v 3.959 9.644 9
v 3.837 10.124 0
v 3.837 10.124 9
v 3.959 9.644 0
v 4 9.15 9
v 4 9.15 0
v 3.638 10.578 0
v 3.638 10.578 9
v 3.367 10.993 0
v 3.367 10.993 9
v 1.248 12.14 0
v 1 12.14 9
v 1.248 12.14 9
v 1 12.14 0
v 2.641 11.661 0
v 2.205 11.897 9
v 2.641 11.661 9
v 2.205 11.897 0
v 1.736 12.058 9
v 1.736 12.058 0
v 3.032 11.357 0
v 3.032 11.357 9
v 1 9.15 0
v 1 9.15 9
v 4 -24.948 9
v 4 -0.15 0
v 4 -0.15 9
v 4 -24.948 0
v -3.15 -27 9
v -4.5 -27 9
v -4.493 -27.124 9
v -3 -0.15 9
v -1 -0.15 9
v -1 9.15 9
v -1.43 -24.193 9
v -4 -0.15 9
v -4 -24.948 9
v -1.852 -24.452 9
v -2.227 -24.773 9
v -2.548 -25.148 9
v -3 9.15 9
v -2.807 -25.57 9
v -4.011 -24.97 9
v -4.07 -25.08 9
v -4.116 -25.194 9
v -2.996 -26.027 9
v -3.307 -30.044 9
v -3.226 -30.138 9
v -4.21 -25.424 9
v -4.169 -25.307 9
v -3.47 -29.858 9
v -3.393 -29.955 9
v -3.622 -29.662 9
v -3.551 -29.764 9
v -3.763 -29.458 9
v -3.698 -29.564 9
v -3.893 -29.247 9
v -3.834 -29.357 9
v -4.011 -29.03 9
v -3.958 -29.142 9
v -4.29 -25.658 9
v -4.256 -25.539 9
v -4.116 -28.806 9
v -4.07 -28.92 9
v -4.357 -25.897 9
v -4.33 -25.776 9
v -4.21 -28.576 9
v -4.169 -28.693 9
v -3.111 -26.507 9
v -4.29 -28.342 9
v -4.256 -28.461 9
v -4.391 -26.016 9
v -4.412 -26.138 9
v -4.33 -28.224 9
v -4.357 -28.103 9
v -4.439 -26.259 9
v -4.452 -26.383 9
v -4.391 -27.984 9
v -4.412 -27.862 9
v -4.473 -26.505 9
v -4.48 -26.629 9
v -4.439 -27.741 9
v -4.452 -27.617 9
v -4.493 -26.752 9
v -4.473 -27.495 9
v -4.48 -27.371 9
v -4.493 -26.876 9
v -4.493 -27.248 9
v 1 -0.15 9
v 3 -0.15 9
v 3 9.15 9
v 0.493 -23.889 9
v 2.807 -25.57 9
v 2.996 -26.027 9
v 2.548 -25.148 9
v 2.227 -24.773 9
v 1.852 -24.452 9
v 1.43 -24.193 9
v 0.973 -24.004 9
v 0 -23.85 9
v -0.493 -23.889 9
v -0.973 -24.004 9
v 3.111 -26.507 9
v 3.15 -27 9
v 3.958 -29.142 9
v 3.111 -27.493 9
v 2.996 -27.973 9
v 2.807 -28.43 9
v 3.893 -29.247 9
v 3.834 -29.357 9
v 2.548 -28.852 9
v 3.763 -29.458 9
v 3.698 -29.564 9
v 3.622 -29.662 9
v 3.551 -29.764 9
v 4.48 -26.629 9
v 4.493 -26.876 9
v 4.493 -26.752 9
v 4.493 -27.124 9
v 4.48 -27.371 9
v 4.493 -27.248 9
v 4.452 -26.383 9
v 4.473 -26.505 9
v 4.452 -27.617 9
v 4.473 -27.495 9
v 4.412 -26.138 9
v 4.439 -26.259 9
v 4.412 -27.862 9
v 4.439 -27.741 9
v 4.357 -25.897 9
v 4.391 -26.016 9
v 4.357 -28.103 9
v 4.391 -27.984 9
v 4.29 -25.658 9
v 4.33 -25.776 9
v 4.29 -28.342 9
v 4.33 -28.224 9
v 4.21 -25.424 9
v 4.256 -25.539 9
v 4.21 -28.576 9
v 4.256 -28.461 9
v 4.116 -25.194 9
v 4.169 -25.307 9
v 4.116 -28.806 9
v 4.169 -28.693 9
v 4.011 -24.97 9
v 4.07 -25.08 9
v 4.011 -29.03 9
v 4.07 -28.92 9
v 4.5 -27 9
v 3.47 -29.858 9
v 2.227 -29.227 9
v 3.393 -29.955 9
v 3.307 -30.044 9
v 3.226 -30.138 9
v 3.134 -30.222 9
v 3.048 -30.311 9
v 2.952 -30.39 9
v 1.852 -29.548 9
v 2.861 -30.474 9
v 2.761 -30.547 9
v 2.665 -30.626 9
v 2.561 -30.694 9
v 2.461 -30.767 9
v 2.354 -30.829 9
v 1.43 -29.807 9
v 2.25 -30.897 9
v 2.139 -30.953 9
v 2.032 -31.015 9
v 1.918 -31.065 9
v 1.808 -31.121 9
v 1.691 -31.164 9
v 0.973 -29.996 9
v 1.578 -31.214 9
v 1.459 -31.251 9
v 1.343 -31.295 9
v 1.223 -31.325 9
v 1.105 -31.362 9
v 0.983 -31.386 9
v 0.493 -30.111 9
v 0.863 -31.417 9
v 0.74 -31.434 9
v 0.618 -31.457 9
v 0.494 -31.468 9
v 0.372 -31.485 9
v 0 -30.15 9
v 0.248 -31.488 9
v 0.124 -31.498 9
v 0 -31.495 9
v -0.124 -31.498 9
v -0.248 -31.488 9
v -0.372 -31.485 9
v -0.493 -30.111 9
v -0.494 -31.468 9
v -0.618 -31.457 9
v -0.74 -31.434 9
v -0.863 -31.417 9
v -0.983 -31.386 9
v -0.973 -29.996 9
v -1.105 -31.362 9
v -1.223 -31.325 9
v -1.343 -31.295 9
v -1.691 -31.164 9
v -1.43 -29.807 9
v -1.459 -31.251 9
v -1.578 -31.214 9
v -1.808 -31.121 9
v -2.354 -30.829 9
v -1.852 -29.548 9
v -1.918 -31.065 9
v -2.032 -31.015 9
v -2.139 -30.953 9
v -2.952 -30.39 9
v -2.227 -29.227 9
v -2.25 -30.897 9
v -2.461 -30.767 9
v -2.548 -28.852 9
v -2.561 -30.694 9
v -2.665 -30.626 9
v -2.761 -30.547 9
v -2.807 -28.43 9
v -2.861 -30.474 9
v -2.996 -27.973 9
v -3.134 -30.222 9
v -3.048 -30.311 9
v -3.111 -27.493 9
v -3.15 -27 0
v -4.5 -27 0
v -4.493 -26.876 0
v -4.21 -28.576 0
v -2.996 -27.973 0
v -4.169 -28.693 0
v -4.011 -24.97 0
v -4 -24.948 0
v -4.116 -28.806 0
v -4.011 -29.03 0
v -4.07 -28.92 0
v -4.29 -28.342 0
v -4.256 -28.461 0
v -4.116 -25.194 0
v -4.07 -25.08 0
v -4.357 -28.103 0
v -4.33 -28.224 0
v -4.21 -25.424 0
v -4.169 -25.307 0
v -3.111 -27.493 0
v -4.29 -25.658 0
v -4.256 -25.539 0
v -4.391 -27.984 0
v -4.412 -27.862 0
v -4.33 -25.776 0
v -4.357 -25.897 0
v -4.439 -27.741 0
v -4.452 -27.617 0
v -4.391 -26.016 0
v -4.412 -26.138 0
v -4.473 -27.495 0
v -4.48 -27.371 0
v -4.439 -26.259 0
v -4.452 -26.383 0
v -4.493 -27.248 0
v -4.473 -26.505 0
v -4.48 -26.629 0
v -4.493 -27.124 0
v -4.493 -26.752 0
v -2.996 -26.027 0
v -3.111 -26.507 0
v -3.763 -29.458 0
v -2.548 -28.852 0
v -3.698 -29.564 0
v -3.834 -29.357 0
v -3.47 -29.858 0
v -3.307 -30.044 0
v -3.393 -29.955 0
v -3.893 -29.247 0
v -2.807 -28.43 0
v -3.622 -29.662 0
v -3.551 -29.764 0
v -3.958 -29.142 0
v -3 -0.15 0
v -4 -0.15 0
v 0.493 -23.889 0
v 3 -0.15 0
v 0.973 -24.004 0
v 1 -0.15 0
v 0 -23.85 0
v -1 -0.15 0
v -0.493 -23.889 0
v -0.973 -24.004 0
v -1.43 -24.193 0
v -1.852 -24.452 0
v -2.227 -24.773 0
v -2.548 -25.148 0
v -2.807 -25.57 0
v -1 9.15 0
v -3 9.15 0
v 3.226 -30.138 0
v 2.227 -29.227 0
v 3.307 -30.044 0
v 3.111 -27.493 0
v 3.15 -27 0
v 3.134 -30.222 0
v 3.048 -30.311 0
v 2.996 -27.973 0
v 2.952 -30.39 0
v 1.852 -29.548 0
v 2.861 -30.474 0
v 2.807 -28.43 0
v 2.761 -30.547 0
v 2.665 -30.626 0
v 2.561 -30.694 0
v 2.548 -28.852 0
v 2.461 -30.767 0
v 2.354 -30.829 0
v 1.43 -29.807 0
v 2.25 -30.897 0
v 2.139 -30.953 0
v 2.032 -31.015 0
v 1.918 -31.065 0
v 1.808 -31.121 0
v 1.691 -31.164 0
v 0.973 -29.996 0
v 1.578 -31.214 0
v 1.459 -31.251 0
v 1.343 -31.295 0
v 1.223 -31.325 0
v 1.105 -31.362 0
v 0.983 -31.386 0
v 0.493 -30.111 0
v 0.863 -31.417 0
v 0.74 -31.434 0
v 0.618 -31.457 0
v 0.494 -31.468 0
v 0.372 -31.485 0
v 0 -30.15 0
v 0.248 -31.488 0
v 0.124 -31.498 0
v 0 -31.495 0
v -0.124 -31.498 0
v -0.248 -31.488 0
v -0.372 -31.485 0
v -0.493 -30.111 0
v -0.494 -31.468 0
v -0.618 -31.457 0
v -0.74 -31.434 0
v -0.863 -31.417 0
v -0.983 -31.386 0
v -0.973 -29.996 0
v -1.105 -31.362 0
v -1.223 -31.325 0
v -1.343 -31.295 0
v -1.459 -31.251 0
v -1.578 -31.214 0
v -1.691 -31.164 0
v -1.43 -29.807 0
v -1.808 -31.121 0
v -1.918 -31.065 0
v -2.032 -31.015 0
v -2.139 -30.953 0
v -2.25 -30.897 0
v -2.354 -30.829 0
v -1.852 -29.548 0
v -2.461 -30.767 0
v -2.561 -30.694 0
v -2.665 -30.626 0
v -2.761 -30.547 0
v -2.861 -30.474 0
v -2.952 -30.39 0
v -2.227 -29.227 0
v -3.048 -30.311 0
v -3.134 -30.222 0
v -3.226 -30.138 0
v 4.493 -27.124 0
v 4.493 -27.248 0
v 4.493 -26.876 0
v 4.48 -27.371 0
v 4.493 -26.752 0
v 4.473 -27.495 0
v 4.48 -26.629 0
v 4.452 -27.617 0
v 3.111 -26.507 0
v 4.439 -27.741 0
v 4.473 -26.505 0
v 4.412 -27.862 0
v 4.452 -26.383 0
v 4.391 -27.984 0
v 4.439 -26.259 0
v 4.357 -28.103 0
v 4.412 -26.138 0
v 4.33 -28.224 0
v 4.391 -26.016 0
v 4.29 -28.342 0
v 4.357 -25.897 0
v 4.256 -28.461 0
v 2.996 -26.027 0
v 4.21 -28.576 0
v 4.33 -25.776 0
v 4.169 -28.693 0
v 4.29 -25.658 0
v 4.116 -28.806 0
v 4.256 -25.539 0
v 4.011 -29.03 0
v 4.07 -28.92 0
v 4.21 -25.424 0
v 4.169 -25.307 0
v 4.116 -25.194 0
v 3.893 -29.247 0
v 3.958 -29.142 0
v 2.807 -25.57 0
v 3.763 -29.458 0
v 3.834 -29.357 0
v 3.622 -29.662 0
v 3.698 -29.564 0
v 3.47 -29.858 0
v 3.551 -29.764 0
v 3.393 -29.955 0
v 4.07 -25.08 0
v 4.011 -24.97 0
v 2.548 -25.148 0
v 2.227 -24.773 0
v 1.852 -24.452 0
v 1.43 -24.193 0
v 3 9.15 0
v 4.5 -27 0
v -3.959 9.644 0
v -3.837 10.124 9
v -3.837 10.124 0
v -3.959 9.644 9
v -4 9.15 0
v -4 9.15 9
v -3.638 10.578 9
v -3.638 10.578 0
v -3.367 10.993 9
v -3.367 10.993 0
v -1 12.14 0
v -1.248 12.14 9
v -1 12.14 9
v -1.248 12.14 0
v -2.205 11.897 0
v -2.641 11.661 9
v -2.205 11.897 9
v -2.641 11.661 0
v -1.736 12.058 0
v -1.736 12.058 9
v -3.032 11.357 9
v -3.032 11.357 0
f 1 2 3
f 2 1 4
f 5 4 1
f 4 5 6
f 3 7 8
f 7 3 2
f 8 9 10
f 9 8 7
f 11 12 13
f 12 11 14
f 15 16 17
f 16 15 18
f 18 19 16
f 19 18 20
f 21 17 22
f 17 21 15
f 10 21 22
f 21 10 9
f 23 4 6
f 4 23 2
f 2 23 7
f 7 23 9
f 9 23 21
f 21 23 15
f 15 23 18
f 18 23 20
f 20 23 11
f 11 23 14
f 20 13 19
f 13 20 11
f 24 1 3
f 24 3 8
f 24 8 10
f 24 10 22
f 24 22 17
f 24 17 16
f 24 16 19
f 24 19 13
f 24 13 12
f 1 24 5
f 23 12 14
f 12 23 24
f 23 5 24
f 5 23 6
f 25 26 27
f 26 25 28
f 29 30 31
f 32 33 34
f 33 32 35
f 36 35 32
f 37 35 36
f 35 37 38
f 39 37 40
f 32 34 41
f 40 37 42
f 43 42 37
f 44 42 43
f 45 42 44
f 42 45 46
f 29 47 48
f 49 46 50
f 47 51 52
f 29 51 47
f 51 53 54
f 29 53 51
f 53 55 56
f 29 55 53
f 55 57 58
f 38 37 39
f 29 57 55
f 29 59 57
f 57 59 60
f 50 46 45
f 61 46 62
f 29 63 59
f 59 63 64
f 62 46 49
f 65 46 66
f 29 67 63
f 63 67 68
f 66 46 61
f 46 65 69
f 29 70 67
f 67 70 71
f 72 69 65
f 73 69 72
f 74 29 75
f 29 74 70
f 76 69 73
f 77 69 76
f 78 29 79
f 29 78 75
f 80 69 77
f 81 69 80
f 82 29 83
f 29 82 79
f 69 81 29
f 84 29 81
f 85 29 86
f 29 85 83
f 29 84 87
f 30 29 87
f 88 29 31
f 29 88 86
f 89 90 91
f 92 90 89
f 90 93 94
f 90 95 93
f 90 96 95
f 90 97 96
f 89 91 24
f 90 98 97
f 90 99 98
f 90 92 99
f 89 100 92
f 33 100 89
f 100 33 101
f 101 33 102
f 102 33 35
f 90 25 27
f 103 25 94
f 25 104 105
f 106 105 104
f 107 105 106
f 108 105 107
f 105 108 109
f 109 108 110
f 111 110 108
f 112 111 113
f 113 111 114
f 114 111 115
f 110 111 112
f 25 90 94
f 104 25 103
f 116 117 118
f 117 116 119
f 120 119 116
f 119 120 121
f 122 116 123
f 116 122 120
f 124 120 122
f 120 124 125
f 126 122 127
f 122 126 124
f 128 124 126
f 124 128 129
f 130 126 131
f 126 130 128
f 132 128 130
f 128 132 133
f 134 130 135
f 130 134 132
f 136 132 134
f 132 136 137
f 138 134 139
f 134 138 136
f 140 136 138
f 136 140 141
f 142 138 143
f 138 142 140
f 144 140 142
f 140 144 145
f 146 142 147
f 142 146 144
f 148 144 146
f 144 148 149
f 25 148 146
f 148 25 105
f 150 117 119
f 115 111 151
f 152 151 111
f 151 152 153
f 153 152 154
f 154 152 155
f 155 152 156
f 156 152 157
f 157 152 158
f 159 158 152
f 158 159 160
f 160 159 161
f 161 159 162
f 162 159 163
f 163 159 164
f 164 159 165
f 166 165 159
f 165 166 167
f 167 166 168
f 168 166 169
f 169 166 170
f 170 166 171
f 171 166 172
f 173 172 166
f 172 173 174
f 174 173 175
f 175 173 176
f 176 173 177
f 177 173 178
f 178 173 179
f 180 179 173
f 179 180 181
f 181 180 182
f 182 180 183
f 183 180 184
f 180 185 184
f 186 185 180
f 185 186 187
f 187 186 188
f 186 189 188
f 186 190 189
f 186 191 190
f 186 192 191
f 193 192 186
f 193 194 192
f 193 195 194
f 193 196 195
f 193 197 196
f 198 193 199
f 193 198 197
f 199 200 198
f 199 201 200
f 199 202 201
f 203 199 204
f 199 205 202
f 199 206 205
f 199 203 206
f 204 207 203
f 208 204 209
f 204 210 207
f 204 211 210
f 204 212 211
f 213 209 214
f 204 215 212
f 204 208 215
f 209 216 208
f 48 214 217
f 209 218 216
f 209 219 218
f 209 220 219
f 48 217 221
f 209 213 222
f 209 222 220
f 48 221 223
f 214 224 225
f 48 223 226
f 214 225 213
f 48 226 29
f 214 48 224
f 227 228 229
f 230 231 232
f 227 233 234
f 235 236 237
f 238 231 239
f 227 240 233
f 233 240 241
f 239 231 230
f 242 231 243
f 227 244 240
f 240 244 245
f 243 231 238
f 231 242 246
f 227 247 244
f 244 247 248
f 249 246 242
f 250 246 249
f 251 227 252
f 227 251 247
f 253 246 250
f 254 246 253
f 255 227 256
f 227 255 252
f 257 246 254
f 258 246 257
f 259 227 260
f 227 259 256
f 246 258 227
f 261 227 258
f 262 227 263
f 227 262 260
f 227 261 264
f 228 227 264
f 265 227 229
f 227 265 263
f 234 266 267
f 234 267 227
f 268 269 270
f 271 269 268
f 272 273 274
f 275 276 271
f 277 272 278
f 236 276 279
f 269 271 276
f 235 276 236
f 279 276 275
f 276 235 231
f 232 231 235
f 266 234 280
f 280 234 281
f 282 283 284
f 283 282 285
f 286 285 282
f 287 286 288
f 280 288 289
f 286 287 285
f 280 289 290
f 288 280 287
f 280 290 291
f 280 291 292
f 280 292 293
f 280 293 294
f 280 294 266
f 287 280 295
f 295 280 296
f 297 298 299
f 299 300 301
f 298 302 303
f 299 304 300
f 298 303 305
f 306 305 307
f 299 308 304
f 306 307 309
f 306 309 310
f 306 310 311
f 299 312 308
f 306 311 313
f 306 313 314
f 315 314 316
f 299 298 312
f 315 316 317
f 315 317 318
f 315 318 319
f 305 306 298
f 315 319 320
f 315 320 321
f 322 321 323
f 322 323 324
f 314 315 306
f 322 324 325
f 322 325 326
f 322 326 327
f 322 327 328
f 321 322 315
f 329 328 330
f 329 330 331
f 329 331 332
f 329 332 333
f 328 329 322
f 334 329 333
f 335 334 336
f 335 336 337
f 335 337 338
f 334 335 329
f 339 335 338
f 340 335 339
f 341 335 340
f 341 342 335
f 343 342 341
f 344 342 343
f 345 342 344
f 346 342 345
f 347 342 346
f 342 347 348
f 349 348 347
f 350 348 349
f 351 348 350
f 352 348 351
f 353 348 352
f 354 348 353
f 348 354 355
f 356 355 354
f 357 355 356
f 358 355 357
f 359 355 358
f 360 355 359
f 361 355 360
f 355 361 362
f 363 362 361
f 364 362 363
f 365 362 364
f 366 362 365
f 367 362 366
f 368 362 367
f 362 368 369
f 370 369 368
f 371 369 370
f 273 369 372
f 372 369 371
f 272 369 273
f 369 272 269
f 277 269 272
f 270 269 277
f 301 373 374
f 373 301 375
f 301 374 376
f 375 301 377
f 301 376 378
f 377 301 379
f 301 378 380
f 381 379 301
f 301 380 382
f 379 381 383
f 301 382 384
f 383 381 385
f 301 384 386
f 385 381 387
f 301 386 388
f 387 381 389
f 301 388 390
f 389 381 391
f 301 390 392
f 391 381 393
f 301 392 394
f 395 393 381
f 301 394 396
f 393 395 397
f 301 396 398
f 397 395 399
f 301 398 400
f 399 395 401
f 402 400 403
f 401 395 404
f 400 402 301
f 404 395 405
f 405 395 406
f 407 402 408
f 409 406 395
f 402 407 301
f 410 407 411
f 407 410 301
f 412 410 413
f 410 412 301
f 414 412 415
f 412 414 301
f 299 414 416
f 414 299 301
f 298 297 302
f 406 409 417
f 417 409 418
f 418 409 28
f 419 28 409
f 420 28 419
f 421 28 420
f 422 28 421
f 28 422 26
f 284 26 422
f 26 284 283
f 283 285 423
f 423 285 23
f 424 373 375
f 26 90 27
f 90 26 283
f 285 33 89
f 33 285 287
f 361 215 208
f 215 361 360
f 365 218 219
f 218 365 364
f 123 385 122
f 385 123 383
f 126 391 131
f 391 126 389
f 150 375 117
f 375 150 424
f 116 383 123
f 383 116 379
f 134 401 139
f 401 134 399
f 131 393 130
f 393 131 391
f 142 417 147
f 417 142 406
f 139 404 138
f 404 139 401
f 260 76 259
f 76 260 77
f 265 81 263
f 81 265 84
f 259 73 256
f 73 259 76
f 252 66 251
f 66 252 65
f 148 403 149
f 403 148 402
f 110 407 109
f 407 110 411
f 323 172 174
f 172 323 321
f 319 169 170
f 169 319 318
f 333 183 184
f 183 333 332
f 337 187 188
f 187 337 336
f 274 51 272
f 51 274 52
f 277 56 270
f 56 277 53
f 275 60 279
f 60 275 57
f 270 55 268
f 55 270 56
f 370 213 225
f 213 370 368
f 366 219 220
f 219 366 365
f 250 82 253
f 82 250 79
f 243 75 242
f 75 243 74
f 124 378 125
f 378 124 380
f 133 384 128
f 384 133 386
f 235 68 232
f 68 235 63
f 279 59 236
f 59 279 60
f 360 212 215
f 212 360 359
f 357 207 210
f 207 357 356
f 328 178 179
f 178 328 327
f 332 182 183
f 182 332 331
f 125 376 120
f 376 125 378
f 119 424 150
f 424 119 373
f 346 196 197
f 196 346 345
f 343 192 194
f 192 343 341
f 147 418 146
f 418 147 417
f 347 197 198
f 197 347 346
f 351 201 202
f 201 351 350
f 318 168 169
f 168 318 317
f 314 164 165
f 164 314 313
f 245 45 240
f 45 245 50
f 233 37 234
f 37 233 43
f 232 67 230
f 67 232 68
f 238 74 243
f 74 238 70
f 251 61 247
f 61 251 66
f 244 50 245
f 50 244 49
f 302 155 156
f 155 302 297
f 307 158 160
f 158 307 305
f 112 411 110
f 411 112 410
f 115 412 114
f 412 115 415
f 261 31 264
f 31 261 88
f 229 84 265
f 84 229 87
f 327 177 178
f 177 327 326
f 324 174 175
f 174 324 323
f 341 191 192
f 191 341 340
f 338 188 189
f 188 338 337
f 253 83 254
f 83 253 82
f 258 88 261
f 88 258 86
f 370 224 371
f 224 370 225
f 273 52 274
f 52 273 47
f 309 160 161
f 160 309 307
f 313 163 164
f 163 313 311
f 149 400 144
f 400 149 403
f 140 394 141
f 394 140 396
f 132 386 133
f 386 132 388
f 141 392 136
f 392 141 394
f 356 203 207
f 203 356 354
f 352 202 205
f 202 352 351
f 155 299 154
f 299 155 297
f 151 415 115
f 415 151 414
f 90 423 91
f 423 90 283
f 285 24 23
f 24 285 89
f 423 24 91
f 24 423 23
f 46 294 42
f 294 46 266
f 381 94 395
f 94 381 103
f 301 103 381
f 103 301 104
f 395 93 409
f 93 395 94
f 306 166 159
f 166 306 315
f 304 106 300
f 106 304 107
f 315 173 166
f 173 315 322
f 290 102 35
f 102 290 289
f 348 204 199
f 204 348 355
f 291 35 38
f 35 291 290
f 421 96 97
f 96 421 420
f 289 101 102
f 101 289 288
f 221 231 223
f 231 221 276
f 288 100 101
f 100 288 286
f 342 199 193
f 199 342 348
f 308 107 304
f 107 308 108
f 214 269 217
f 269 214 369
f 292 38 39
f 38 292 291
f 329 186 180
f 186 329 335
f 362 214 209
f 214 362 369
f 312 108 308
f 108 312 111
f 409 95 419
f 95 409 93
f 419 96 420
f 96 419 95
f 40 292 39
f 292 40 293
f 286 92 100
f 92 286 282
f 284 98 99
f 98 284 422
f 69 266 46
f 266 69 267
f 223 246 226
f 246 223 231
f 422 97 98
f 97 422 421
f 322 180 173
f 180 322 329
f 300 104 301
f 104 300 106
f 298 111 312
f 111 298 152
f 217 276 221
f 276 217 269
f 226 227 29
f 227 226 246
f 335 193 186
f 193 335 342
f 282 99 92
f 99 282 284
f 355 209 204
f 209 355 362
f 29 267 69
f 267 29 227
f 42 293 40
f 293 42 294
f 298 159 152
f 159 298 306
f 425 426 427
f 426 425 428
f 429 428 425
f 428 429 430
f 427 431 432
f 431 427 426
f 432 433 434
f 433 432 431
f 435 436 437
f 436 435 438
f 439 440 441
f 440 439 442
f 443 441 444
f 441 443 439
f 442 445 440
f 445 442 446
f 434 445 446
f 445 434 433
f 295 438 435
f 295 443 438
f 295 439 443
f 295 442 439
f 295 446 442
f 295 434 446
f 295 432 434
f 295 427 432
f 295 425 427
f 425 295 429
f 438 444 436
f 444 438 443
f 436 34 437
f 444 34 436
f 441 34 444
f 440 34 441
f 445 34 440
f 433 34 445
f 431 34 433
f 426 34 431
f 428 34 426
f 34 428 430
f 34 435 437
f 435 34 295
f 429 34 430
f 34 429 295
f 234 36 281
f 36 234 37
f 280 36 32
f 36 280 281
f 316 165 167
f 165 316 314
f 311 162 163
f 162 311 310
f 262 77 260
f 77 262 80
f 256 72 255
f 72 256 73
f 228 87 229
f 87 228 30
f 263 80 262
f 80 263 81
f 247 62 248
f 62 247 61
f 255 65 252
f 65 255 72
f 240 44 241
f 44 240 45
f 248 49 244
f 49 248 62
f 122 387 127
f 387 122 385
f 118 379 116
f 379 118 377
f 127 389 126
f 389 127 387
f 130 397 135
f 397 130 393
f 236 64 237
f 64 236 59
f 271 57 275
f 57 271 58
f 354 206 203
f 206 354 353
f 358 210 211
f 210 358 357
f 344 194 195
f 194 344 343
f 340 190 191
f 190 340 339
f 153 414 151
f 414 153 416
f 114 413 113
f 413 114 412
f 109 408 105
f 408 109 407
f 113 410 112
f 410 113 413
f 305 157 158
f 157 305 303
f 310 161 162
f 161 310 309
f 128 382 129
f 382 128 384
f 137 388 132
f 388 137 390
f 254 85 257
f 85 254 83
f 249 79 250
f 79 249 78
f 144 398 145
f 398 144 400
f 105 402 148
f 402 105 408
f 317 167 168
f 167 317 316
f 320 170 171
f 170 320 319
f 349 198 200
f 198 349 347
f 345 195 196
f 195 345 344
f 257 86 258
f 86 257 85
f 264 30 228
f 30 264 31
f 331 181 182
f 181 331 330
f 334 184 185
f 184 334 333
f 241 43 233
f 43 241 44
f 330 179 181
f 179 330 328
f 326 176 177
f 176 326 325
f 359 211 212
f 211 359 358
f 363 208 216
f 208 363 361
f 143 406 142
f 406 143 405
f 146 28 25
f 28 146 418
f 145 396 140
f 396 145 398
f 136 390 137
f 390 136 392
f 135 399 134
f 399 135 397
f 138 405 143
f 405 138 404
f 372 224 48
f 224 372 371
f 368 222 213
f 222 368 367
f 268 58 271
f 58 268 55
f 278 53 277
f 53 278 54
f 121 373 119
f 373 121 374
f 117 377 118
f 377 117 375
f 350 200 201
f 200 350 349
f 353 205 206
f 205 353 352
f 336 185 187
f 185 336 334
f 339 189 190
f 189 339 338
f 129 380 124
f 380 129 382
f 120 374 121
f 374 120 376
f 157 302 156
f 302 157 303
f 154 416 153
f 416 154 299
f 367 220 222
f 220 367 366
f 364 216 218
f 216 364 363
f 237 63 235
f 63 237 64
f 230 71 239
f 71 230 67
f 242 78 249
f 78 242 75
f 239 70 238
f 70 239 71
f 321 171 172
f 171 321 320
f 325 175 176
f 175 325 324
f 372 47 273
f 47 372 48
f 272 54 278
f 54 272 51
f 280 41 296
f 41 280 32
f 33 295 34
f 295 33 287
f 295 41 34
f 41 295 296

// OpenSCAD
$fa=4;
$fs=0.5;

tolerance=0.15;

arm();
//translate([0,0,45]) rotate([180,0,0]) castor_mount();

cmw = 20; //castor mount width

//what are the dimension of the wheels
castor_top = 15 + 20 + 3 + 1; //from ground
peg_radius = 2.5;
peg_height = 10; //without the pin lip
horizontal_space = 15 + 5 + 7; //tire to pin + 5

//////////////////////////////

module castor_frame_mount(thickness = 3, height = 30) {
	translate([-cmw/2,0,0]) {
		difference() {
			cube([cmw,thickness,height]);
			//TODO some holes/peg to attache the other part ??
		}
	}
}

module castor_mount(thickness = 3, height = 30) {
	
	t = thickness;
	ground_clearance = 30 - 21 - thickness;
	h1 = castor_top - ground_clearance;
	h = h1 + peg_height - 1 + t;
	p = peg_radius+t/2-3+2+tolerance;

	union() {
		difference(){
			translate([-t,0,0]) cube([cmw+2*t,3*t,h]);
			translate([-tolerance,t-tolerance,-0.5]) cube([cmw+2*tolerance, t+2*tolerance, height+1]);
			translate([0,-t/2,-1]) cube([1,2*t,height+1]);
			translate([cmw-1,-t/2,-1]) cube([1,2*t,height+1]);
			translate([-t-1,2*t-tolerance,-1]) cube([cmw+2*t+2,t+2,t+1+tolerance]);
			translate([cmw/2-p,-1,h1]) cube([2*p,3*t+2,peg_height-1+tolerance]);
		}
		//lip
		translate([-t,0,-tolerance])
		rotate([0,90,0])
		intersection(){
			translate([0,t*3/4,0]) scale([1,-.75,1]) cylinder(r=t,h=cmw+2*t);
			cube([t,2*t,cmw+2*t]);
		}
		translate([1,0,-2*tolerance]) cube([cmw-2,t,3*tolerance]);
		//top platform
		//...
	}
}

module arm(t=3) {
	union(){
		arm_half(t);
		mirror([1,0,0]) arm_half(t);
	}
}

module arm_half(t = 3) {
   ro = peg_radius+t/2;
	h = peg_height-1;
	difference() {
		union(){
			translate([0,-horizontal_space-tolerance,0]) cube([ro,horizontal_space,h]);
			translate([0,-horizontal_space,0]) cylinder(r=ro+0.5,h=h);
			translate([ro-3,-tolerance,0]) cube([2,3*t+2*tolerance,h]);
			translate([ro-3,3*t+tolerance,0]) intersection() {
				cylinder(r=3, h=h);
				cube([3,3,h]);
			}
		}
		translate([0,-horizontal_space,-1]) cylinder(r=peg_radius+tolerance+0.5,h=peg_height+2);
	}
}
